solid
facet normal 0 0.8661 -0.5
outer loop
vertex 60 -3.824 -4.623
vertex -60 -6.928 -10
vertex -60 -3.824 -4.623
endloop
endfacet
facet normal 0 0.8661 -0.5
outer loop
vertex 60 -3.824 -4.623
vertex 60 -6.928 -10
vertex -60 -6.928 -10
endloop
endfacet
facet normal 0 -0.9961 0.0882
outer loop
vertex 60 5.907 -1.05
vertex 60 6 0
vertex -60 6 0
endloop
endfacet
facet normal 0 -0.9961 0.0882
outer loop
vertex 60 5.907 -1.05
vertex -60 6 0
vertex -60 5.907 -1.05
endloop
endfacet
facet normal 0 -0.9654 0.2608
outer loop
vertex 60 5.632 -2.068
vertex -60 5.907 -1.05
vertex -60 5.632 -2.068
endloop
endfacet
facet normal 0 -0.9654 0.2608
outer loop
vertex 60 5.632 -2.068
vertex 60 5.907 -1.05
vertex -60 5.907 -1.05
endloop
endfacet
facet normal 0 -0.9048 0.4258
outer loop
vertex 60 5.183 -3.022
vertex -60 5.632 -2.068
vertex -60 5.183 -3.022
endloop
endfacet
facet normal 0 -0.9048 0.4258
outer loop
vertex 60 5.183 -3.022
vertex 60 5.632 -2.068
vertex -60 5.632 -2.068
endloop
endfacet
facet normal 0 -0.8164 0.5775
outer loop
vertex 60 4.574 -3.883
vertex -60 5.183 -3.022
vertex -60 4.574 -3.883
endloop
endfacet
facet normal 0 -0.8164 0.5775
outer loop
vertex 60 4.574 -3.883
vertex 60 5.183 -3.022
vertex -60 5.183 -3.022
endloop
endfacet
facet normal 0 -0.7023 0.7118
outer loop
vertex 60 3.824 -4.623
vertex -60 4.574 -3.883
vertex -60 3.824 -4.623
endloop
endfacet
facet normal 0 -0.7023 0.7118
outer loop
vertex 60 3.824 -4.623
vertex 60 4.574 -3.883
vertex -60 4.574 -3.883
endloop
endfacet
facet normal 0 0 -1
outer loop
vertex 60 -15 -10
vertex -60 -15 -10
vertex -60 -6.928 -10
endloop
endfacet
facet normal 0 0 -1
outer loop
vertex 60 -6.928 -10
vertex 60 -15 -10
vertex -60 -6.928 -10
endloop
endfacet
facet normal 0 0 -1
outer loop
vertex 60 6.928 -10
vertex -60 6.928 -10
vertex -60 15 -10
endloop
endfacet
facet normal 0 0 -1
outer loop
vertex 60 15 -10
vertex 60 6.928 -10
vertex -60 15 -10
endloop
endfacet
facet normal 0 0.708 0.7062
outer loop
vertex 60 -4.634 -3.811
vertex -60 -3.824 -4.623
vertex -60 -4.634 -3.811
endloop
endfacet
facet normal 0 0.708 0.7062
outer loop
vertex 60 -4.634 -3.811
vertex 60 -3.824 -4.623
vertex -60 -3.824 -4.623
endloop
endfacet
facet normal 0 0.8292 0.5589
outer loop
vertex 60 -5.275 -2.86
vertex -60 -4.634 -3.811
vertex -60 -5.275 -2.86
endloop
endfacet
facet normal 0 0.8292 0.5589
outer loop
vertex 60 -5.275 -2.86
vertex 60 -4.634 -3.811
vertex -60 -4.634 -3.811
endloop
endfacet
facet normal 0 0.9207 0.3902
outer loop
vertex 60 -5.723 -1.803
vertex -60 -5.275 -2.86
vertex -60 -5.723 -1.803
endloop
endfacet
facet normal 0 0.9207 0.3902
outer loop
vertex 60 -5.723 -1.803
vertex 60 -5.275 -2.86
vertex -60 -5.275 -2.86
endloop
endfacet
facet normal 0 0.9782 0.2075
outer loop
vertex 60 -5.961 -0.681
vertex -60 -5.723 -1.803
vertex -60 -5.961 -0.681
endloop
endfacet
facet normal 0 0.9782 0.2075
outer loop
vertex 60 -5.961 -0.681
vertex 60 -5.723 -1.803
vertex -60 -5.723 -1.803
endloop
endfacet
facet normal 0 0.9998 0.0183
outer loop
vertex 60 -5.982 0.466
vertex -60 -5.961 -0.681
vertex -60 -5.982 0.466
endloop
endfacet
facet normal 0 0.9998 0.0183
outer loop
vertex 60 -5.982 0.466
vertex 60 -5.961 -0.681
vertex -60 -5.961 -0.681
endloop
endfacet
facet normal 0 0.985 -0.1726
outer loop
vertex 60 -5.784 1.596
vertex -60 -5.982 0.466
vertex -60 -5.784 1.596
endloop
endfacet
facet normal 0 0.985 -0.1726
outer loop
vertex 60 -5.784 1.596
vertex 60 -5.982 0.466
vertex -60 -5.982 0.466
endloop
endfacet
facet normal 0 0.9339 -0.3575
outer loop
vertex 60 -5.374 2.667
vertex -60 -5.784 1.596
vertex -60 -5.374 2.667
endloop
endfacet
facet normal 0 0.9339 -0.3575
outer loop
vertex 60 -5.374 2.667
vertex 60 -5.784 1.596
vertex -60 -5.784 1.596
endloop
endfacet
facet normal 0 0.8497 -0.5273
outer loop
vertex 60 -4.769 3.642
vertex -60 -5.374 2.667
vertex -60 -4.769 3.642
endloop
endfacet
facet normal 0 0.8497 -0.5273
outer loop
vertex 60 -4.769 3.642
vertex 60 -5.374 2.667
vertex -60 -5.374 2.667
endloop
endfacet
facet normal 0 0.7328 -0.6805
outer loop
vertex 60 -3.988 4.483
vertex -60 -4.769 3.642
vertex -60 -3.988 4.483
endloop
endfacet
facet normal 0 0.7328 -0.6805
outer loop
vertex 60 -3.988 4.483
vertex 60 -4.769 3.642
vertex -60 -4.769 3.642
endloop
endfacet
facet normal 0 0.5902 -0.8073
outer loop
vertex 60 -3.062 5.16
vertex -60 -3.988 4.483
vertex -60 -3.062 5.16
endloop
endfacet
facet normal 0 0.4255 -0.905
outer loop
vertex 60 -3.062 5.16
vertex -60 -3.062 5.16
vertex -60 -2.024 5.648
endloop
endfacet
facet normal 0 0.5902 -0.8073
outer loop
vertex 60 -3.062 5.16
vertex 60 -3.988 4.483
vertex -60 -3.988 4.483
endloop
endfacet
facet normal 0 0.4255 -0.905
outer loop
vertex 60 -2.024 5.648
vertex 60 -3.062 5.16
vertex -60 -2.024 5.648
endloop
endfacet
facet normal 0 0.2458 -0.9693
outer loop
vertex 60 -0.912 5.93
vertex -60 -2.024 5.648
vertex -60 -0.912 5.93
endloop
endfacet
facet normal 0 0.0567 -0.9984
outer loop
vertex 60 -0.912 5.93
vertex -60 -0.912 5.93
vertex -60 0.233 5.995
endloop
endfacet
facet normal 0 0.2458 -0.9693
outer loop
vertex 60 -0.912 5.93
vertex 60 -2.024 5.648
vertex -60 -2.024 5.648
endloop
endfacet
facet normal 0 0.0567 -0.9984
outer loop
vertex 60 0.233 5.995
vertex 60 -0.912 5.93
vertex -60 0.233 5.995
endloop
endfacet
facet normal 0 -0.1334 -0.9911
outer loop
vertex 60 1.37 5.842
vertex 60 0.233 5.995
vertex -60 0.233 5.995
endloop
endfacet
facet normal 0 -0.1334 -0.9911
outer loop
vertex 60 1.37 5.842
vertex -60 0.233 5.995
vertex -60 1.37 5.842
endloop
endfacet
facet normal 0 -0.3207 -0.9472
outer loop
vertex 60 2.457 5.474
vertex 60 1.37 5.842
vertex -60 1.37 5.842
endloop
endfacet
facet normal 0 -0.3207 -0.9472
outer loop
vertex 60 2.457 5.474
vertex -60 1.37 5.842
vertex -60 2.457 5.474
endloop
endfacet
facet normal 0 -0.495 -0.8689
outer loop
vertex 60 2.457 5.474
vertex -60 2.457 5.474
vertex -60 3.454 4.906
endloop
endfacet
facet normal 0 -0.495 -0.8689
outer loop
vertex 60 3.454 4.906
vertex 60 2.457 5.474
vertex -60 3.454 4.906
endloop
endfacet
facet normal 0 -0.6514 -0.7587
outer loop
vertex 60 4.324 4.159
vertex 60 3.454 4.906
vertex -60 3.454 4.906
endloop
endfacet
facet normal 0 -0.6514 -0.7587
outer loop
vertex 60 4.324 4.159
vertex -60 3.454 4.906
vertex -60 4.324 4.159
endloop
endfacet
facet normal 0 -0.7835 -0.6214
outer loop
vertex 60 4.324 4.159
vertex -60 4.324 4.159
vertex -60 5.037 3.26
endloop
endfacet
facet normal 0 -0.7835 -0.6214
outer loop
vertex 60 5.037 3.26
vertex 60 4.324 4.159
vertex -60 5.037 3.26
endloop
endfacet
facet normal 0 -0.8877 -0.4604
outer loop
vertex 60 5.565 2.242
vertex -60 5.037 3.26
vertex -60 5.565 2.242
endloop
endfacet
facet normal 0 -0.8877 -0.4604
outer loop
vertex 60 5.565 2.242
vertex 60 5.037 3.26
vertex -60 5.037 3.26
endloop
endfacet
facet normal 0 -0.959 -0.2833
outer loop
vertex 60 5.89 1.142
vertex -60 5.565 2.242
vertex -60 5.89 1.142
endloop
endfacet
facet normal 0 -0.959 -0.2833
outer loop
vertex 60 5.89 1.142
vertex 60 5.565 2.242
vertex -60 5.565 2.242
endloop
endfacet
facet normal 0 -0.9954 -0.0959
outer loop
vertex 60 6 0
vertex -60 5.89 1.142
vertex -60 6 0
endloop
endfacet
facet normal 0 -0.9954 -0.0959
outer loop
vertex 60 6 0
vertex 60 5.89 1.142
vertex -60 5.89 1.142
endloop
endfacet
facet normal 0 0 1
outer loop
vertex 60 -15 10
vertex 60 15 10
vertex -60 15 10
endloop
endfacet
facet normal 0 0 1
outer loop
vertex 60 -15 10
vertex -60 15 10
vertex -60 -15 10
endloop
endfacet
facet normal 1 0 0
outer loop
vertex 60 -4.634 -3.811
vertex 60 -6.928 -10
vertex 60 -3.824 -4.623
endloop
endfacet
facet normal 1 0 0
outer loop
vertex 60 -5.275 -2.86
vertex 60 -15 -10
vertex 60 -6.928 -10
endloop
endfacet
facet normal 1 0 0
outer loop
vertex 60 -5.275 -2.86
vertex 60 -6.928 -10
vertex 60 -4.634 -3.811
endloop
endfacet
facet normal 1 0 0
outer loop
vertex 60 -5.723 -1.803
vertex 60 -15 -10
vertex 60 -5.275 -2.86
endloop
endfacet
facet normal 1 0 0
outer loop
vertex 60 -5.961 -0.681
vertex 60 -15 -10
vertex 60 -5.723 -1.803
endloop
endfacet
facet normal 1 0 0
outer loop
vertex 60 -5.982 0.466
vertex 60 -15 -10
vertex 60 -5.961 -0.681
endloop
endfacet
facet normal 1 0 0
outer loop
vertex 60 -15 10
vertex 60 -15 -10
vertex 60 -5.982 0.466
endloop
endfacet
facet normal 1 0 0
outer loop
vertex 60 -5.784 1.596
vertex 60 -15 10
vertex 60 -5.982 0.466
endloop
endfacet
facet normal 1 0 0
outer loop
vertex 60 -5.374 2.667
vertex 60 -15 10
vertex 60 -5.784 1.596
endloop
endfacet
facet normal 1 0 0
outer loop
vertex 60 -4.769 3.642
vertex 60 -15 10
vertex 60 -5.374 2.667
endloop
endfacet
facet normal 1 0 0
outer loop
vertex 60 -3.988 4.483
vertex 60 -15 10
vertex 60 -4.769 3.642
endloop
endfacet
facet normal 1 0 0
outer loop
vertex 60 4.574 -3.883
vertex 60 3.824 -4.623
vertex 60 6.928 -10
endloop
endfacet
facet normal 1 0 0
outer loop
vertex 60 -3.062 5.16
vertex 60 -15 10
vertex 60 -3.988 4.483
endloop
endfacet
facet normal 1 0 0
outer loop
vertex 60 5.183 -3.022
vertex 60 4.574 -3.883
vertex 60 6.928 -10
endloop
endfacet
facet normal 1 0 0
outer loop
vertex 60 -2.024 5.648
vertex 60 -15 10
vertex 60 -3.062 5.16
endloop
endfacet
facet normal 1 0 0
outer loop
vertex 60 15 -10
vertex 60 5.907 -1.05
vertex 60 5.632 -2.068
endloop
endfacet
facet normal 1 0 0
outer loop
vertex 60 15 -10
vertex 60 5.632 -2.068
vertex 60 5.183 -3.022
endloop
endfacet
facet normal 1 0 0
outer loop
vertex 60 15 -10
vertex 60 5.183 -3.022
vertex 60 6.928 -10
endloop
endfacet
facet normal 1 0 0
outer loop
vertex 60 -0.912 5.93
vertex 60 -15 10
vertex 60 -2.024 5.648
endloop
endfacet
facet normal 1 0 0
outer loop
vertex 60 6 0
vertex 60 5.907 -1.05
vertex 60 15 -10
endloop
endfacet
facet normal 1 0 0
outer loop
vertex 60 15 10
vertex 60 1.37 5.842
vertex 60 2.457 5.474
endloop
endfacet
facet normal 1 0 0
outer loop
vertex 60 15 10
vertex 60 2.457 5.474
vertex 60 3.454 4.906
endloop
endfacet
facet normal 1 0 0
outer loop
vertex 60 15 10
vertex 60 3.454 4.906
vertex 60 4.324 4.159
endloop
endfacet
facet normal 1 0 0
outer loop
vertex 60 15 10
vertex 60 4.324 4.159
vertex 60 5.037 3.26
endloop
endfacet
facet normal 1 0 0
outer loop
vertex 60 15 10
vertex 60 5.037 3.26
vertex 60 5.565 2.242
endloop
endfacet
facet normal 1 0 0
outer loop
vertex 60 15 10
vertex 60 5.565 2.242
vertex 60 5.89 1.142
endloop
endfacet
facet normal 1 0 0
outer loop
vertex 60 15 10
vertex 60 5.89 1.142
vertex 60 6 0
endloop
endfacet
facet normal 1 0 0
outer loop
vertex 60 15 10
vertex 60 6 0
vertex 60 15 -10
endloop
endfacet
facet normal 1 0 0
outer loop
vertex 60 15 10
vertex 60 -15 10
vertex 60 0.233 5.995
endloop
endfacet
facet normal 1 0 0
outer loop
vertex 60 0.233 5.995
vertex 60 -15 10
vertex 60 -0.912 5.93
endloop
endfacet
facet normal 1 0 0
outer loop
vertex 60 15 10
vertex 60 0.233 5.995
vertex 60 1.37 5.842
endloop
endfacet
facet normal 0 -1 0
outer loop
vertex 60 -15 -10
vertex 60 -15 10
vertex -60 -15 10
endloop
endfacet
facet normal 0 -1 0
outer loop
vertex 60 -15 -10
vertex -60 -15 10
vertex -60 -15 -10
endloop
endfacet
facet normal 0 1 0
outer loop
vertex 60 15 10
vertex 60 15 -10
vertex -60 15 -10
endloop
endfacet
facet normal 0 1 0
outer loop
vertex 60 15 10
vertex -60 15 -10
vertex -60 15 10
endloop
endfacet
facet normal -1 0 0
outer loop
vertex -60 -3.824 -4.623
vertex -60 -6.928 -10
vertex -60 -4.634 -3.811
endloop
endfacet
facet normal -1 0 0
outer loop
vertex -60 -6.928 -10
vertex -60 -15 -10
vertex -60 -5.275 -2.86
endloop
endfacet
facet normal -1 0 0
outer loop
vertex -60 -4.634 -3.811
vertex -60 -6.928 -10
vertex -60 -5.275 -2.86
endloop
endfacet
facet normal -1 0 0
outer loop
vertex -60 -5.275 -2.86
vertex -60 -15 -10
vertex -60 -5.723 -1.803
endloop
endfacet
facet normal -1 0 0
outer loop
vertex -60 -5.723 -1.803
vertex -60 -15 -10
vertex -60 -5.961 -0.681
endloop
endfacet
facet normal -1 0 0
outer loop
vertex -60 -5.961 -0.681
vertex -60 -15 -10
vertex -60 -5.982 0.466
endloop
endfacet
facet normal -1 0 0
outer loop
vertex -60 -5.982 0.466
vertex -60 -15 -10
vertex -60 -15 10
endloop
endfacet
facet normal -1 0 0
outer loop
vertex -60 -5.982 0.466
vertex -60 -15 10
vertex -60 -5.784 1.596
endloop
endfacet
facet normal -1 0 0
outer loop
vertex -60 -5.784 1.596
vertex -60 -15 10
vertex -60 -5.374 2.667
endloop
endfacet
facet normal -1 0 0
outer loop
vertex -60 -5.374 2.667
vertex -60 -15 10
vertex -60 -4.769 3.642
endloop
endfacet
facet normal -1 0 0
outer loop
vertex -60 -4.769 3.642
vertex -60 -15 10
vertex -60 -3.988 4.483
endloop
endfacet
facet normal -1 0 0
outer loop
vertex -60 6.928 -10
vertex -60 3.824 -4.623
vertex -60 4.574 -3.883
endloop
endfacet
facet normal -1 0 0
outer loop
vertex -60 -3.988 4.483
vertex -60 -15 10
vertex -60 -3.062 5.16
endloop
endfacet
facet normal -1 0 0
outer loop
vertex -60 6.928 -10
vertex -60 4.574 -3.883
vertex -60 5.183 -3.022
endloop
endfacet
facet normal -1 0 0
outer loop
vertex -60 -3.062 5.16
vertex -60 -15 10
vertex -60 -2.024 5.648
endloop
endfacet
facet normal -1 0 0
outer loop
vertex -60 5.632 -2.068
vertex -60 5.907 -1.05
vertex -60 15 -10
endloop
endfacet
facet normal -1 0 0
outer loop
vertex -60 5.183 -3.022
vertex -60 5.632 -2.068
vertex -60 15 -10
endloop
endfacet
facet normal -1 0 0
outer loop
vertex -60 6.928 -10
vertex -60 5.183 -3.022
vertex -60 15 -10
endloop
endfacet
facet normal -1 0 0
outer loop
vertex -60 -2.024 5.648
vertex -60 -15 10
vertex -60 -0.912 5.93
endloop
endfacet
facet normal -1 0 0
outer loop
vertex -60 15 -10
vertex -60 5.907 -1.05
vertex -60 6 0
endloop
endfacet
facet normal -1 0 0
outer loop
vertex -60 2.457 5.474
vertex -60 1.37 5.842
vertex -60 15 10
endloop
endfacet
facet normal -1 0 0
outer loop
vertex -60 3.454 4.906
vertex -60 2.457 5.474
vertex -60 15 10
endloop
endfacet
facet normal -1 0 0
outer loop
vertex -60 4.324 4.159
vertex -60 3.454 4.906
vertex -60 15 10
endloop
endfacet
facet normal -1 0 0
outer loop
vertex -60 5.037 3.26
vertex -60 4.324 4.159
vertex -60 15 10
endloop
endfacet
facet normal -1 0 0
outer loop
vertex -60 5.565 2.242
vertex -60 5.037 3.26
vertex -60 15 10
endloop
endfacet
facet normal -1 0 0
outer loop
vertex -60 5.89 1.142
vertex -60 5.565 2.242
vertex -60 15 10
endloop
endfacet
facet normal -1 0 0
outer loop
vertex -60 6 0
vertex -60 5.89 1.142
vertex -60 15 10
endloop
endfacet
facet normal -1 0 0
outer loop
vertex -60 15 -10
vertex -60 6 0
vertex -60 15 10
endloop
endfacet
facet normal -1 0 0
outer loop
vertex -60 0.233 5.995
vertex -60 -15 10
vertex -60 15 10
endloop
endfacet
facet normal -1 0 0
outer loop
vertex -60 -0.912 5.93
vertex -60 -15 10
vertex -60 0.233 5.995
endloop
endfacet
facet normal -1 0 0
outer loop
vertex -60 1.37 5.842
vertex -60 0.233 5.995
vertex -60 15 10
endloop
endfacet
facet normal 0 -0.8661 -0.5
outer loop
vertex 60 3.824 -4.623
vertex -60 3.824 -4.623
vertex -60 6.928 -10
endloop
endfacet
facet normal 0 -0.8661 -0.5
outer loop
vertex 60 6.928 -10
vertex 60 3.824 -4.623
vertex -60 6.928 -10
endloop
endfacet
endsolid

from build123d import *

# Parameters (mm, degrees)
F1_DEPTH = 60


with BuildPart() as f1:
    # F0 (on Right) → F1 (new body, symmetric)
    with BuildSketch(Plane.YZ):
        with BuildLine():
            ThreePointArc((-3.824065, -4.623475), (-2.554957, 5.42883), (6, 0))
            ThreePointArc((6, 0), (5.42883, -2.554957), (3.824065, -4.623475))
            Line((3.824065, -4.623475), (6.928203, -10))
            Line((6.928203, -10), (15, -10))
            Line((15, -10), (15, 10))
            Line((15, 10), (-15, 10))
            Line((-15, 10), (-15, -10))
            Line((-15, -10), (-6.928203, -10))
            Line((-6.928203, -10), (-3.824065, -4.623475))
        make_face()
    extrude(amount=F1_DEPTH, both=True)


solid = f1.part
